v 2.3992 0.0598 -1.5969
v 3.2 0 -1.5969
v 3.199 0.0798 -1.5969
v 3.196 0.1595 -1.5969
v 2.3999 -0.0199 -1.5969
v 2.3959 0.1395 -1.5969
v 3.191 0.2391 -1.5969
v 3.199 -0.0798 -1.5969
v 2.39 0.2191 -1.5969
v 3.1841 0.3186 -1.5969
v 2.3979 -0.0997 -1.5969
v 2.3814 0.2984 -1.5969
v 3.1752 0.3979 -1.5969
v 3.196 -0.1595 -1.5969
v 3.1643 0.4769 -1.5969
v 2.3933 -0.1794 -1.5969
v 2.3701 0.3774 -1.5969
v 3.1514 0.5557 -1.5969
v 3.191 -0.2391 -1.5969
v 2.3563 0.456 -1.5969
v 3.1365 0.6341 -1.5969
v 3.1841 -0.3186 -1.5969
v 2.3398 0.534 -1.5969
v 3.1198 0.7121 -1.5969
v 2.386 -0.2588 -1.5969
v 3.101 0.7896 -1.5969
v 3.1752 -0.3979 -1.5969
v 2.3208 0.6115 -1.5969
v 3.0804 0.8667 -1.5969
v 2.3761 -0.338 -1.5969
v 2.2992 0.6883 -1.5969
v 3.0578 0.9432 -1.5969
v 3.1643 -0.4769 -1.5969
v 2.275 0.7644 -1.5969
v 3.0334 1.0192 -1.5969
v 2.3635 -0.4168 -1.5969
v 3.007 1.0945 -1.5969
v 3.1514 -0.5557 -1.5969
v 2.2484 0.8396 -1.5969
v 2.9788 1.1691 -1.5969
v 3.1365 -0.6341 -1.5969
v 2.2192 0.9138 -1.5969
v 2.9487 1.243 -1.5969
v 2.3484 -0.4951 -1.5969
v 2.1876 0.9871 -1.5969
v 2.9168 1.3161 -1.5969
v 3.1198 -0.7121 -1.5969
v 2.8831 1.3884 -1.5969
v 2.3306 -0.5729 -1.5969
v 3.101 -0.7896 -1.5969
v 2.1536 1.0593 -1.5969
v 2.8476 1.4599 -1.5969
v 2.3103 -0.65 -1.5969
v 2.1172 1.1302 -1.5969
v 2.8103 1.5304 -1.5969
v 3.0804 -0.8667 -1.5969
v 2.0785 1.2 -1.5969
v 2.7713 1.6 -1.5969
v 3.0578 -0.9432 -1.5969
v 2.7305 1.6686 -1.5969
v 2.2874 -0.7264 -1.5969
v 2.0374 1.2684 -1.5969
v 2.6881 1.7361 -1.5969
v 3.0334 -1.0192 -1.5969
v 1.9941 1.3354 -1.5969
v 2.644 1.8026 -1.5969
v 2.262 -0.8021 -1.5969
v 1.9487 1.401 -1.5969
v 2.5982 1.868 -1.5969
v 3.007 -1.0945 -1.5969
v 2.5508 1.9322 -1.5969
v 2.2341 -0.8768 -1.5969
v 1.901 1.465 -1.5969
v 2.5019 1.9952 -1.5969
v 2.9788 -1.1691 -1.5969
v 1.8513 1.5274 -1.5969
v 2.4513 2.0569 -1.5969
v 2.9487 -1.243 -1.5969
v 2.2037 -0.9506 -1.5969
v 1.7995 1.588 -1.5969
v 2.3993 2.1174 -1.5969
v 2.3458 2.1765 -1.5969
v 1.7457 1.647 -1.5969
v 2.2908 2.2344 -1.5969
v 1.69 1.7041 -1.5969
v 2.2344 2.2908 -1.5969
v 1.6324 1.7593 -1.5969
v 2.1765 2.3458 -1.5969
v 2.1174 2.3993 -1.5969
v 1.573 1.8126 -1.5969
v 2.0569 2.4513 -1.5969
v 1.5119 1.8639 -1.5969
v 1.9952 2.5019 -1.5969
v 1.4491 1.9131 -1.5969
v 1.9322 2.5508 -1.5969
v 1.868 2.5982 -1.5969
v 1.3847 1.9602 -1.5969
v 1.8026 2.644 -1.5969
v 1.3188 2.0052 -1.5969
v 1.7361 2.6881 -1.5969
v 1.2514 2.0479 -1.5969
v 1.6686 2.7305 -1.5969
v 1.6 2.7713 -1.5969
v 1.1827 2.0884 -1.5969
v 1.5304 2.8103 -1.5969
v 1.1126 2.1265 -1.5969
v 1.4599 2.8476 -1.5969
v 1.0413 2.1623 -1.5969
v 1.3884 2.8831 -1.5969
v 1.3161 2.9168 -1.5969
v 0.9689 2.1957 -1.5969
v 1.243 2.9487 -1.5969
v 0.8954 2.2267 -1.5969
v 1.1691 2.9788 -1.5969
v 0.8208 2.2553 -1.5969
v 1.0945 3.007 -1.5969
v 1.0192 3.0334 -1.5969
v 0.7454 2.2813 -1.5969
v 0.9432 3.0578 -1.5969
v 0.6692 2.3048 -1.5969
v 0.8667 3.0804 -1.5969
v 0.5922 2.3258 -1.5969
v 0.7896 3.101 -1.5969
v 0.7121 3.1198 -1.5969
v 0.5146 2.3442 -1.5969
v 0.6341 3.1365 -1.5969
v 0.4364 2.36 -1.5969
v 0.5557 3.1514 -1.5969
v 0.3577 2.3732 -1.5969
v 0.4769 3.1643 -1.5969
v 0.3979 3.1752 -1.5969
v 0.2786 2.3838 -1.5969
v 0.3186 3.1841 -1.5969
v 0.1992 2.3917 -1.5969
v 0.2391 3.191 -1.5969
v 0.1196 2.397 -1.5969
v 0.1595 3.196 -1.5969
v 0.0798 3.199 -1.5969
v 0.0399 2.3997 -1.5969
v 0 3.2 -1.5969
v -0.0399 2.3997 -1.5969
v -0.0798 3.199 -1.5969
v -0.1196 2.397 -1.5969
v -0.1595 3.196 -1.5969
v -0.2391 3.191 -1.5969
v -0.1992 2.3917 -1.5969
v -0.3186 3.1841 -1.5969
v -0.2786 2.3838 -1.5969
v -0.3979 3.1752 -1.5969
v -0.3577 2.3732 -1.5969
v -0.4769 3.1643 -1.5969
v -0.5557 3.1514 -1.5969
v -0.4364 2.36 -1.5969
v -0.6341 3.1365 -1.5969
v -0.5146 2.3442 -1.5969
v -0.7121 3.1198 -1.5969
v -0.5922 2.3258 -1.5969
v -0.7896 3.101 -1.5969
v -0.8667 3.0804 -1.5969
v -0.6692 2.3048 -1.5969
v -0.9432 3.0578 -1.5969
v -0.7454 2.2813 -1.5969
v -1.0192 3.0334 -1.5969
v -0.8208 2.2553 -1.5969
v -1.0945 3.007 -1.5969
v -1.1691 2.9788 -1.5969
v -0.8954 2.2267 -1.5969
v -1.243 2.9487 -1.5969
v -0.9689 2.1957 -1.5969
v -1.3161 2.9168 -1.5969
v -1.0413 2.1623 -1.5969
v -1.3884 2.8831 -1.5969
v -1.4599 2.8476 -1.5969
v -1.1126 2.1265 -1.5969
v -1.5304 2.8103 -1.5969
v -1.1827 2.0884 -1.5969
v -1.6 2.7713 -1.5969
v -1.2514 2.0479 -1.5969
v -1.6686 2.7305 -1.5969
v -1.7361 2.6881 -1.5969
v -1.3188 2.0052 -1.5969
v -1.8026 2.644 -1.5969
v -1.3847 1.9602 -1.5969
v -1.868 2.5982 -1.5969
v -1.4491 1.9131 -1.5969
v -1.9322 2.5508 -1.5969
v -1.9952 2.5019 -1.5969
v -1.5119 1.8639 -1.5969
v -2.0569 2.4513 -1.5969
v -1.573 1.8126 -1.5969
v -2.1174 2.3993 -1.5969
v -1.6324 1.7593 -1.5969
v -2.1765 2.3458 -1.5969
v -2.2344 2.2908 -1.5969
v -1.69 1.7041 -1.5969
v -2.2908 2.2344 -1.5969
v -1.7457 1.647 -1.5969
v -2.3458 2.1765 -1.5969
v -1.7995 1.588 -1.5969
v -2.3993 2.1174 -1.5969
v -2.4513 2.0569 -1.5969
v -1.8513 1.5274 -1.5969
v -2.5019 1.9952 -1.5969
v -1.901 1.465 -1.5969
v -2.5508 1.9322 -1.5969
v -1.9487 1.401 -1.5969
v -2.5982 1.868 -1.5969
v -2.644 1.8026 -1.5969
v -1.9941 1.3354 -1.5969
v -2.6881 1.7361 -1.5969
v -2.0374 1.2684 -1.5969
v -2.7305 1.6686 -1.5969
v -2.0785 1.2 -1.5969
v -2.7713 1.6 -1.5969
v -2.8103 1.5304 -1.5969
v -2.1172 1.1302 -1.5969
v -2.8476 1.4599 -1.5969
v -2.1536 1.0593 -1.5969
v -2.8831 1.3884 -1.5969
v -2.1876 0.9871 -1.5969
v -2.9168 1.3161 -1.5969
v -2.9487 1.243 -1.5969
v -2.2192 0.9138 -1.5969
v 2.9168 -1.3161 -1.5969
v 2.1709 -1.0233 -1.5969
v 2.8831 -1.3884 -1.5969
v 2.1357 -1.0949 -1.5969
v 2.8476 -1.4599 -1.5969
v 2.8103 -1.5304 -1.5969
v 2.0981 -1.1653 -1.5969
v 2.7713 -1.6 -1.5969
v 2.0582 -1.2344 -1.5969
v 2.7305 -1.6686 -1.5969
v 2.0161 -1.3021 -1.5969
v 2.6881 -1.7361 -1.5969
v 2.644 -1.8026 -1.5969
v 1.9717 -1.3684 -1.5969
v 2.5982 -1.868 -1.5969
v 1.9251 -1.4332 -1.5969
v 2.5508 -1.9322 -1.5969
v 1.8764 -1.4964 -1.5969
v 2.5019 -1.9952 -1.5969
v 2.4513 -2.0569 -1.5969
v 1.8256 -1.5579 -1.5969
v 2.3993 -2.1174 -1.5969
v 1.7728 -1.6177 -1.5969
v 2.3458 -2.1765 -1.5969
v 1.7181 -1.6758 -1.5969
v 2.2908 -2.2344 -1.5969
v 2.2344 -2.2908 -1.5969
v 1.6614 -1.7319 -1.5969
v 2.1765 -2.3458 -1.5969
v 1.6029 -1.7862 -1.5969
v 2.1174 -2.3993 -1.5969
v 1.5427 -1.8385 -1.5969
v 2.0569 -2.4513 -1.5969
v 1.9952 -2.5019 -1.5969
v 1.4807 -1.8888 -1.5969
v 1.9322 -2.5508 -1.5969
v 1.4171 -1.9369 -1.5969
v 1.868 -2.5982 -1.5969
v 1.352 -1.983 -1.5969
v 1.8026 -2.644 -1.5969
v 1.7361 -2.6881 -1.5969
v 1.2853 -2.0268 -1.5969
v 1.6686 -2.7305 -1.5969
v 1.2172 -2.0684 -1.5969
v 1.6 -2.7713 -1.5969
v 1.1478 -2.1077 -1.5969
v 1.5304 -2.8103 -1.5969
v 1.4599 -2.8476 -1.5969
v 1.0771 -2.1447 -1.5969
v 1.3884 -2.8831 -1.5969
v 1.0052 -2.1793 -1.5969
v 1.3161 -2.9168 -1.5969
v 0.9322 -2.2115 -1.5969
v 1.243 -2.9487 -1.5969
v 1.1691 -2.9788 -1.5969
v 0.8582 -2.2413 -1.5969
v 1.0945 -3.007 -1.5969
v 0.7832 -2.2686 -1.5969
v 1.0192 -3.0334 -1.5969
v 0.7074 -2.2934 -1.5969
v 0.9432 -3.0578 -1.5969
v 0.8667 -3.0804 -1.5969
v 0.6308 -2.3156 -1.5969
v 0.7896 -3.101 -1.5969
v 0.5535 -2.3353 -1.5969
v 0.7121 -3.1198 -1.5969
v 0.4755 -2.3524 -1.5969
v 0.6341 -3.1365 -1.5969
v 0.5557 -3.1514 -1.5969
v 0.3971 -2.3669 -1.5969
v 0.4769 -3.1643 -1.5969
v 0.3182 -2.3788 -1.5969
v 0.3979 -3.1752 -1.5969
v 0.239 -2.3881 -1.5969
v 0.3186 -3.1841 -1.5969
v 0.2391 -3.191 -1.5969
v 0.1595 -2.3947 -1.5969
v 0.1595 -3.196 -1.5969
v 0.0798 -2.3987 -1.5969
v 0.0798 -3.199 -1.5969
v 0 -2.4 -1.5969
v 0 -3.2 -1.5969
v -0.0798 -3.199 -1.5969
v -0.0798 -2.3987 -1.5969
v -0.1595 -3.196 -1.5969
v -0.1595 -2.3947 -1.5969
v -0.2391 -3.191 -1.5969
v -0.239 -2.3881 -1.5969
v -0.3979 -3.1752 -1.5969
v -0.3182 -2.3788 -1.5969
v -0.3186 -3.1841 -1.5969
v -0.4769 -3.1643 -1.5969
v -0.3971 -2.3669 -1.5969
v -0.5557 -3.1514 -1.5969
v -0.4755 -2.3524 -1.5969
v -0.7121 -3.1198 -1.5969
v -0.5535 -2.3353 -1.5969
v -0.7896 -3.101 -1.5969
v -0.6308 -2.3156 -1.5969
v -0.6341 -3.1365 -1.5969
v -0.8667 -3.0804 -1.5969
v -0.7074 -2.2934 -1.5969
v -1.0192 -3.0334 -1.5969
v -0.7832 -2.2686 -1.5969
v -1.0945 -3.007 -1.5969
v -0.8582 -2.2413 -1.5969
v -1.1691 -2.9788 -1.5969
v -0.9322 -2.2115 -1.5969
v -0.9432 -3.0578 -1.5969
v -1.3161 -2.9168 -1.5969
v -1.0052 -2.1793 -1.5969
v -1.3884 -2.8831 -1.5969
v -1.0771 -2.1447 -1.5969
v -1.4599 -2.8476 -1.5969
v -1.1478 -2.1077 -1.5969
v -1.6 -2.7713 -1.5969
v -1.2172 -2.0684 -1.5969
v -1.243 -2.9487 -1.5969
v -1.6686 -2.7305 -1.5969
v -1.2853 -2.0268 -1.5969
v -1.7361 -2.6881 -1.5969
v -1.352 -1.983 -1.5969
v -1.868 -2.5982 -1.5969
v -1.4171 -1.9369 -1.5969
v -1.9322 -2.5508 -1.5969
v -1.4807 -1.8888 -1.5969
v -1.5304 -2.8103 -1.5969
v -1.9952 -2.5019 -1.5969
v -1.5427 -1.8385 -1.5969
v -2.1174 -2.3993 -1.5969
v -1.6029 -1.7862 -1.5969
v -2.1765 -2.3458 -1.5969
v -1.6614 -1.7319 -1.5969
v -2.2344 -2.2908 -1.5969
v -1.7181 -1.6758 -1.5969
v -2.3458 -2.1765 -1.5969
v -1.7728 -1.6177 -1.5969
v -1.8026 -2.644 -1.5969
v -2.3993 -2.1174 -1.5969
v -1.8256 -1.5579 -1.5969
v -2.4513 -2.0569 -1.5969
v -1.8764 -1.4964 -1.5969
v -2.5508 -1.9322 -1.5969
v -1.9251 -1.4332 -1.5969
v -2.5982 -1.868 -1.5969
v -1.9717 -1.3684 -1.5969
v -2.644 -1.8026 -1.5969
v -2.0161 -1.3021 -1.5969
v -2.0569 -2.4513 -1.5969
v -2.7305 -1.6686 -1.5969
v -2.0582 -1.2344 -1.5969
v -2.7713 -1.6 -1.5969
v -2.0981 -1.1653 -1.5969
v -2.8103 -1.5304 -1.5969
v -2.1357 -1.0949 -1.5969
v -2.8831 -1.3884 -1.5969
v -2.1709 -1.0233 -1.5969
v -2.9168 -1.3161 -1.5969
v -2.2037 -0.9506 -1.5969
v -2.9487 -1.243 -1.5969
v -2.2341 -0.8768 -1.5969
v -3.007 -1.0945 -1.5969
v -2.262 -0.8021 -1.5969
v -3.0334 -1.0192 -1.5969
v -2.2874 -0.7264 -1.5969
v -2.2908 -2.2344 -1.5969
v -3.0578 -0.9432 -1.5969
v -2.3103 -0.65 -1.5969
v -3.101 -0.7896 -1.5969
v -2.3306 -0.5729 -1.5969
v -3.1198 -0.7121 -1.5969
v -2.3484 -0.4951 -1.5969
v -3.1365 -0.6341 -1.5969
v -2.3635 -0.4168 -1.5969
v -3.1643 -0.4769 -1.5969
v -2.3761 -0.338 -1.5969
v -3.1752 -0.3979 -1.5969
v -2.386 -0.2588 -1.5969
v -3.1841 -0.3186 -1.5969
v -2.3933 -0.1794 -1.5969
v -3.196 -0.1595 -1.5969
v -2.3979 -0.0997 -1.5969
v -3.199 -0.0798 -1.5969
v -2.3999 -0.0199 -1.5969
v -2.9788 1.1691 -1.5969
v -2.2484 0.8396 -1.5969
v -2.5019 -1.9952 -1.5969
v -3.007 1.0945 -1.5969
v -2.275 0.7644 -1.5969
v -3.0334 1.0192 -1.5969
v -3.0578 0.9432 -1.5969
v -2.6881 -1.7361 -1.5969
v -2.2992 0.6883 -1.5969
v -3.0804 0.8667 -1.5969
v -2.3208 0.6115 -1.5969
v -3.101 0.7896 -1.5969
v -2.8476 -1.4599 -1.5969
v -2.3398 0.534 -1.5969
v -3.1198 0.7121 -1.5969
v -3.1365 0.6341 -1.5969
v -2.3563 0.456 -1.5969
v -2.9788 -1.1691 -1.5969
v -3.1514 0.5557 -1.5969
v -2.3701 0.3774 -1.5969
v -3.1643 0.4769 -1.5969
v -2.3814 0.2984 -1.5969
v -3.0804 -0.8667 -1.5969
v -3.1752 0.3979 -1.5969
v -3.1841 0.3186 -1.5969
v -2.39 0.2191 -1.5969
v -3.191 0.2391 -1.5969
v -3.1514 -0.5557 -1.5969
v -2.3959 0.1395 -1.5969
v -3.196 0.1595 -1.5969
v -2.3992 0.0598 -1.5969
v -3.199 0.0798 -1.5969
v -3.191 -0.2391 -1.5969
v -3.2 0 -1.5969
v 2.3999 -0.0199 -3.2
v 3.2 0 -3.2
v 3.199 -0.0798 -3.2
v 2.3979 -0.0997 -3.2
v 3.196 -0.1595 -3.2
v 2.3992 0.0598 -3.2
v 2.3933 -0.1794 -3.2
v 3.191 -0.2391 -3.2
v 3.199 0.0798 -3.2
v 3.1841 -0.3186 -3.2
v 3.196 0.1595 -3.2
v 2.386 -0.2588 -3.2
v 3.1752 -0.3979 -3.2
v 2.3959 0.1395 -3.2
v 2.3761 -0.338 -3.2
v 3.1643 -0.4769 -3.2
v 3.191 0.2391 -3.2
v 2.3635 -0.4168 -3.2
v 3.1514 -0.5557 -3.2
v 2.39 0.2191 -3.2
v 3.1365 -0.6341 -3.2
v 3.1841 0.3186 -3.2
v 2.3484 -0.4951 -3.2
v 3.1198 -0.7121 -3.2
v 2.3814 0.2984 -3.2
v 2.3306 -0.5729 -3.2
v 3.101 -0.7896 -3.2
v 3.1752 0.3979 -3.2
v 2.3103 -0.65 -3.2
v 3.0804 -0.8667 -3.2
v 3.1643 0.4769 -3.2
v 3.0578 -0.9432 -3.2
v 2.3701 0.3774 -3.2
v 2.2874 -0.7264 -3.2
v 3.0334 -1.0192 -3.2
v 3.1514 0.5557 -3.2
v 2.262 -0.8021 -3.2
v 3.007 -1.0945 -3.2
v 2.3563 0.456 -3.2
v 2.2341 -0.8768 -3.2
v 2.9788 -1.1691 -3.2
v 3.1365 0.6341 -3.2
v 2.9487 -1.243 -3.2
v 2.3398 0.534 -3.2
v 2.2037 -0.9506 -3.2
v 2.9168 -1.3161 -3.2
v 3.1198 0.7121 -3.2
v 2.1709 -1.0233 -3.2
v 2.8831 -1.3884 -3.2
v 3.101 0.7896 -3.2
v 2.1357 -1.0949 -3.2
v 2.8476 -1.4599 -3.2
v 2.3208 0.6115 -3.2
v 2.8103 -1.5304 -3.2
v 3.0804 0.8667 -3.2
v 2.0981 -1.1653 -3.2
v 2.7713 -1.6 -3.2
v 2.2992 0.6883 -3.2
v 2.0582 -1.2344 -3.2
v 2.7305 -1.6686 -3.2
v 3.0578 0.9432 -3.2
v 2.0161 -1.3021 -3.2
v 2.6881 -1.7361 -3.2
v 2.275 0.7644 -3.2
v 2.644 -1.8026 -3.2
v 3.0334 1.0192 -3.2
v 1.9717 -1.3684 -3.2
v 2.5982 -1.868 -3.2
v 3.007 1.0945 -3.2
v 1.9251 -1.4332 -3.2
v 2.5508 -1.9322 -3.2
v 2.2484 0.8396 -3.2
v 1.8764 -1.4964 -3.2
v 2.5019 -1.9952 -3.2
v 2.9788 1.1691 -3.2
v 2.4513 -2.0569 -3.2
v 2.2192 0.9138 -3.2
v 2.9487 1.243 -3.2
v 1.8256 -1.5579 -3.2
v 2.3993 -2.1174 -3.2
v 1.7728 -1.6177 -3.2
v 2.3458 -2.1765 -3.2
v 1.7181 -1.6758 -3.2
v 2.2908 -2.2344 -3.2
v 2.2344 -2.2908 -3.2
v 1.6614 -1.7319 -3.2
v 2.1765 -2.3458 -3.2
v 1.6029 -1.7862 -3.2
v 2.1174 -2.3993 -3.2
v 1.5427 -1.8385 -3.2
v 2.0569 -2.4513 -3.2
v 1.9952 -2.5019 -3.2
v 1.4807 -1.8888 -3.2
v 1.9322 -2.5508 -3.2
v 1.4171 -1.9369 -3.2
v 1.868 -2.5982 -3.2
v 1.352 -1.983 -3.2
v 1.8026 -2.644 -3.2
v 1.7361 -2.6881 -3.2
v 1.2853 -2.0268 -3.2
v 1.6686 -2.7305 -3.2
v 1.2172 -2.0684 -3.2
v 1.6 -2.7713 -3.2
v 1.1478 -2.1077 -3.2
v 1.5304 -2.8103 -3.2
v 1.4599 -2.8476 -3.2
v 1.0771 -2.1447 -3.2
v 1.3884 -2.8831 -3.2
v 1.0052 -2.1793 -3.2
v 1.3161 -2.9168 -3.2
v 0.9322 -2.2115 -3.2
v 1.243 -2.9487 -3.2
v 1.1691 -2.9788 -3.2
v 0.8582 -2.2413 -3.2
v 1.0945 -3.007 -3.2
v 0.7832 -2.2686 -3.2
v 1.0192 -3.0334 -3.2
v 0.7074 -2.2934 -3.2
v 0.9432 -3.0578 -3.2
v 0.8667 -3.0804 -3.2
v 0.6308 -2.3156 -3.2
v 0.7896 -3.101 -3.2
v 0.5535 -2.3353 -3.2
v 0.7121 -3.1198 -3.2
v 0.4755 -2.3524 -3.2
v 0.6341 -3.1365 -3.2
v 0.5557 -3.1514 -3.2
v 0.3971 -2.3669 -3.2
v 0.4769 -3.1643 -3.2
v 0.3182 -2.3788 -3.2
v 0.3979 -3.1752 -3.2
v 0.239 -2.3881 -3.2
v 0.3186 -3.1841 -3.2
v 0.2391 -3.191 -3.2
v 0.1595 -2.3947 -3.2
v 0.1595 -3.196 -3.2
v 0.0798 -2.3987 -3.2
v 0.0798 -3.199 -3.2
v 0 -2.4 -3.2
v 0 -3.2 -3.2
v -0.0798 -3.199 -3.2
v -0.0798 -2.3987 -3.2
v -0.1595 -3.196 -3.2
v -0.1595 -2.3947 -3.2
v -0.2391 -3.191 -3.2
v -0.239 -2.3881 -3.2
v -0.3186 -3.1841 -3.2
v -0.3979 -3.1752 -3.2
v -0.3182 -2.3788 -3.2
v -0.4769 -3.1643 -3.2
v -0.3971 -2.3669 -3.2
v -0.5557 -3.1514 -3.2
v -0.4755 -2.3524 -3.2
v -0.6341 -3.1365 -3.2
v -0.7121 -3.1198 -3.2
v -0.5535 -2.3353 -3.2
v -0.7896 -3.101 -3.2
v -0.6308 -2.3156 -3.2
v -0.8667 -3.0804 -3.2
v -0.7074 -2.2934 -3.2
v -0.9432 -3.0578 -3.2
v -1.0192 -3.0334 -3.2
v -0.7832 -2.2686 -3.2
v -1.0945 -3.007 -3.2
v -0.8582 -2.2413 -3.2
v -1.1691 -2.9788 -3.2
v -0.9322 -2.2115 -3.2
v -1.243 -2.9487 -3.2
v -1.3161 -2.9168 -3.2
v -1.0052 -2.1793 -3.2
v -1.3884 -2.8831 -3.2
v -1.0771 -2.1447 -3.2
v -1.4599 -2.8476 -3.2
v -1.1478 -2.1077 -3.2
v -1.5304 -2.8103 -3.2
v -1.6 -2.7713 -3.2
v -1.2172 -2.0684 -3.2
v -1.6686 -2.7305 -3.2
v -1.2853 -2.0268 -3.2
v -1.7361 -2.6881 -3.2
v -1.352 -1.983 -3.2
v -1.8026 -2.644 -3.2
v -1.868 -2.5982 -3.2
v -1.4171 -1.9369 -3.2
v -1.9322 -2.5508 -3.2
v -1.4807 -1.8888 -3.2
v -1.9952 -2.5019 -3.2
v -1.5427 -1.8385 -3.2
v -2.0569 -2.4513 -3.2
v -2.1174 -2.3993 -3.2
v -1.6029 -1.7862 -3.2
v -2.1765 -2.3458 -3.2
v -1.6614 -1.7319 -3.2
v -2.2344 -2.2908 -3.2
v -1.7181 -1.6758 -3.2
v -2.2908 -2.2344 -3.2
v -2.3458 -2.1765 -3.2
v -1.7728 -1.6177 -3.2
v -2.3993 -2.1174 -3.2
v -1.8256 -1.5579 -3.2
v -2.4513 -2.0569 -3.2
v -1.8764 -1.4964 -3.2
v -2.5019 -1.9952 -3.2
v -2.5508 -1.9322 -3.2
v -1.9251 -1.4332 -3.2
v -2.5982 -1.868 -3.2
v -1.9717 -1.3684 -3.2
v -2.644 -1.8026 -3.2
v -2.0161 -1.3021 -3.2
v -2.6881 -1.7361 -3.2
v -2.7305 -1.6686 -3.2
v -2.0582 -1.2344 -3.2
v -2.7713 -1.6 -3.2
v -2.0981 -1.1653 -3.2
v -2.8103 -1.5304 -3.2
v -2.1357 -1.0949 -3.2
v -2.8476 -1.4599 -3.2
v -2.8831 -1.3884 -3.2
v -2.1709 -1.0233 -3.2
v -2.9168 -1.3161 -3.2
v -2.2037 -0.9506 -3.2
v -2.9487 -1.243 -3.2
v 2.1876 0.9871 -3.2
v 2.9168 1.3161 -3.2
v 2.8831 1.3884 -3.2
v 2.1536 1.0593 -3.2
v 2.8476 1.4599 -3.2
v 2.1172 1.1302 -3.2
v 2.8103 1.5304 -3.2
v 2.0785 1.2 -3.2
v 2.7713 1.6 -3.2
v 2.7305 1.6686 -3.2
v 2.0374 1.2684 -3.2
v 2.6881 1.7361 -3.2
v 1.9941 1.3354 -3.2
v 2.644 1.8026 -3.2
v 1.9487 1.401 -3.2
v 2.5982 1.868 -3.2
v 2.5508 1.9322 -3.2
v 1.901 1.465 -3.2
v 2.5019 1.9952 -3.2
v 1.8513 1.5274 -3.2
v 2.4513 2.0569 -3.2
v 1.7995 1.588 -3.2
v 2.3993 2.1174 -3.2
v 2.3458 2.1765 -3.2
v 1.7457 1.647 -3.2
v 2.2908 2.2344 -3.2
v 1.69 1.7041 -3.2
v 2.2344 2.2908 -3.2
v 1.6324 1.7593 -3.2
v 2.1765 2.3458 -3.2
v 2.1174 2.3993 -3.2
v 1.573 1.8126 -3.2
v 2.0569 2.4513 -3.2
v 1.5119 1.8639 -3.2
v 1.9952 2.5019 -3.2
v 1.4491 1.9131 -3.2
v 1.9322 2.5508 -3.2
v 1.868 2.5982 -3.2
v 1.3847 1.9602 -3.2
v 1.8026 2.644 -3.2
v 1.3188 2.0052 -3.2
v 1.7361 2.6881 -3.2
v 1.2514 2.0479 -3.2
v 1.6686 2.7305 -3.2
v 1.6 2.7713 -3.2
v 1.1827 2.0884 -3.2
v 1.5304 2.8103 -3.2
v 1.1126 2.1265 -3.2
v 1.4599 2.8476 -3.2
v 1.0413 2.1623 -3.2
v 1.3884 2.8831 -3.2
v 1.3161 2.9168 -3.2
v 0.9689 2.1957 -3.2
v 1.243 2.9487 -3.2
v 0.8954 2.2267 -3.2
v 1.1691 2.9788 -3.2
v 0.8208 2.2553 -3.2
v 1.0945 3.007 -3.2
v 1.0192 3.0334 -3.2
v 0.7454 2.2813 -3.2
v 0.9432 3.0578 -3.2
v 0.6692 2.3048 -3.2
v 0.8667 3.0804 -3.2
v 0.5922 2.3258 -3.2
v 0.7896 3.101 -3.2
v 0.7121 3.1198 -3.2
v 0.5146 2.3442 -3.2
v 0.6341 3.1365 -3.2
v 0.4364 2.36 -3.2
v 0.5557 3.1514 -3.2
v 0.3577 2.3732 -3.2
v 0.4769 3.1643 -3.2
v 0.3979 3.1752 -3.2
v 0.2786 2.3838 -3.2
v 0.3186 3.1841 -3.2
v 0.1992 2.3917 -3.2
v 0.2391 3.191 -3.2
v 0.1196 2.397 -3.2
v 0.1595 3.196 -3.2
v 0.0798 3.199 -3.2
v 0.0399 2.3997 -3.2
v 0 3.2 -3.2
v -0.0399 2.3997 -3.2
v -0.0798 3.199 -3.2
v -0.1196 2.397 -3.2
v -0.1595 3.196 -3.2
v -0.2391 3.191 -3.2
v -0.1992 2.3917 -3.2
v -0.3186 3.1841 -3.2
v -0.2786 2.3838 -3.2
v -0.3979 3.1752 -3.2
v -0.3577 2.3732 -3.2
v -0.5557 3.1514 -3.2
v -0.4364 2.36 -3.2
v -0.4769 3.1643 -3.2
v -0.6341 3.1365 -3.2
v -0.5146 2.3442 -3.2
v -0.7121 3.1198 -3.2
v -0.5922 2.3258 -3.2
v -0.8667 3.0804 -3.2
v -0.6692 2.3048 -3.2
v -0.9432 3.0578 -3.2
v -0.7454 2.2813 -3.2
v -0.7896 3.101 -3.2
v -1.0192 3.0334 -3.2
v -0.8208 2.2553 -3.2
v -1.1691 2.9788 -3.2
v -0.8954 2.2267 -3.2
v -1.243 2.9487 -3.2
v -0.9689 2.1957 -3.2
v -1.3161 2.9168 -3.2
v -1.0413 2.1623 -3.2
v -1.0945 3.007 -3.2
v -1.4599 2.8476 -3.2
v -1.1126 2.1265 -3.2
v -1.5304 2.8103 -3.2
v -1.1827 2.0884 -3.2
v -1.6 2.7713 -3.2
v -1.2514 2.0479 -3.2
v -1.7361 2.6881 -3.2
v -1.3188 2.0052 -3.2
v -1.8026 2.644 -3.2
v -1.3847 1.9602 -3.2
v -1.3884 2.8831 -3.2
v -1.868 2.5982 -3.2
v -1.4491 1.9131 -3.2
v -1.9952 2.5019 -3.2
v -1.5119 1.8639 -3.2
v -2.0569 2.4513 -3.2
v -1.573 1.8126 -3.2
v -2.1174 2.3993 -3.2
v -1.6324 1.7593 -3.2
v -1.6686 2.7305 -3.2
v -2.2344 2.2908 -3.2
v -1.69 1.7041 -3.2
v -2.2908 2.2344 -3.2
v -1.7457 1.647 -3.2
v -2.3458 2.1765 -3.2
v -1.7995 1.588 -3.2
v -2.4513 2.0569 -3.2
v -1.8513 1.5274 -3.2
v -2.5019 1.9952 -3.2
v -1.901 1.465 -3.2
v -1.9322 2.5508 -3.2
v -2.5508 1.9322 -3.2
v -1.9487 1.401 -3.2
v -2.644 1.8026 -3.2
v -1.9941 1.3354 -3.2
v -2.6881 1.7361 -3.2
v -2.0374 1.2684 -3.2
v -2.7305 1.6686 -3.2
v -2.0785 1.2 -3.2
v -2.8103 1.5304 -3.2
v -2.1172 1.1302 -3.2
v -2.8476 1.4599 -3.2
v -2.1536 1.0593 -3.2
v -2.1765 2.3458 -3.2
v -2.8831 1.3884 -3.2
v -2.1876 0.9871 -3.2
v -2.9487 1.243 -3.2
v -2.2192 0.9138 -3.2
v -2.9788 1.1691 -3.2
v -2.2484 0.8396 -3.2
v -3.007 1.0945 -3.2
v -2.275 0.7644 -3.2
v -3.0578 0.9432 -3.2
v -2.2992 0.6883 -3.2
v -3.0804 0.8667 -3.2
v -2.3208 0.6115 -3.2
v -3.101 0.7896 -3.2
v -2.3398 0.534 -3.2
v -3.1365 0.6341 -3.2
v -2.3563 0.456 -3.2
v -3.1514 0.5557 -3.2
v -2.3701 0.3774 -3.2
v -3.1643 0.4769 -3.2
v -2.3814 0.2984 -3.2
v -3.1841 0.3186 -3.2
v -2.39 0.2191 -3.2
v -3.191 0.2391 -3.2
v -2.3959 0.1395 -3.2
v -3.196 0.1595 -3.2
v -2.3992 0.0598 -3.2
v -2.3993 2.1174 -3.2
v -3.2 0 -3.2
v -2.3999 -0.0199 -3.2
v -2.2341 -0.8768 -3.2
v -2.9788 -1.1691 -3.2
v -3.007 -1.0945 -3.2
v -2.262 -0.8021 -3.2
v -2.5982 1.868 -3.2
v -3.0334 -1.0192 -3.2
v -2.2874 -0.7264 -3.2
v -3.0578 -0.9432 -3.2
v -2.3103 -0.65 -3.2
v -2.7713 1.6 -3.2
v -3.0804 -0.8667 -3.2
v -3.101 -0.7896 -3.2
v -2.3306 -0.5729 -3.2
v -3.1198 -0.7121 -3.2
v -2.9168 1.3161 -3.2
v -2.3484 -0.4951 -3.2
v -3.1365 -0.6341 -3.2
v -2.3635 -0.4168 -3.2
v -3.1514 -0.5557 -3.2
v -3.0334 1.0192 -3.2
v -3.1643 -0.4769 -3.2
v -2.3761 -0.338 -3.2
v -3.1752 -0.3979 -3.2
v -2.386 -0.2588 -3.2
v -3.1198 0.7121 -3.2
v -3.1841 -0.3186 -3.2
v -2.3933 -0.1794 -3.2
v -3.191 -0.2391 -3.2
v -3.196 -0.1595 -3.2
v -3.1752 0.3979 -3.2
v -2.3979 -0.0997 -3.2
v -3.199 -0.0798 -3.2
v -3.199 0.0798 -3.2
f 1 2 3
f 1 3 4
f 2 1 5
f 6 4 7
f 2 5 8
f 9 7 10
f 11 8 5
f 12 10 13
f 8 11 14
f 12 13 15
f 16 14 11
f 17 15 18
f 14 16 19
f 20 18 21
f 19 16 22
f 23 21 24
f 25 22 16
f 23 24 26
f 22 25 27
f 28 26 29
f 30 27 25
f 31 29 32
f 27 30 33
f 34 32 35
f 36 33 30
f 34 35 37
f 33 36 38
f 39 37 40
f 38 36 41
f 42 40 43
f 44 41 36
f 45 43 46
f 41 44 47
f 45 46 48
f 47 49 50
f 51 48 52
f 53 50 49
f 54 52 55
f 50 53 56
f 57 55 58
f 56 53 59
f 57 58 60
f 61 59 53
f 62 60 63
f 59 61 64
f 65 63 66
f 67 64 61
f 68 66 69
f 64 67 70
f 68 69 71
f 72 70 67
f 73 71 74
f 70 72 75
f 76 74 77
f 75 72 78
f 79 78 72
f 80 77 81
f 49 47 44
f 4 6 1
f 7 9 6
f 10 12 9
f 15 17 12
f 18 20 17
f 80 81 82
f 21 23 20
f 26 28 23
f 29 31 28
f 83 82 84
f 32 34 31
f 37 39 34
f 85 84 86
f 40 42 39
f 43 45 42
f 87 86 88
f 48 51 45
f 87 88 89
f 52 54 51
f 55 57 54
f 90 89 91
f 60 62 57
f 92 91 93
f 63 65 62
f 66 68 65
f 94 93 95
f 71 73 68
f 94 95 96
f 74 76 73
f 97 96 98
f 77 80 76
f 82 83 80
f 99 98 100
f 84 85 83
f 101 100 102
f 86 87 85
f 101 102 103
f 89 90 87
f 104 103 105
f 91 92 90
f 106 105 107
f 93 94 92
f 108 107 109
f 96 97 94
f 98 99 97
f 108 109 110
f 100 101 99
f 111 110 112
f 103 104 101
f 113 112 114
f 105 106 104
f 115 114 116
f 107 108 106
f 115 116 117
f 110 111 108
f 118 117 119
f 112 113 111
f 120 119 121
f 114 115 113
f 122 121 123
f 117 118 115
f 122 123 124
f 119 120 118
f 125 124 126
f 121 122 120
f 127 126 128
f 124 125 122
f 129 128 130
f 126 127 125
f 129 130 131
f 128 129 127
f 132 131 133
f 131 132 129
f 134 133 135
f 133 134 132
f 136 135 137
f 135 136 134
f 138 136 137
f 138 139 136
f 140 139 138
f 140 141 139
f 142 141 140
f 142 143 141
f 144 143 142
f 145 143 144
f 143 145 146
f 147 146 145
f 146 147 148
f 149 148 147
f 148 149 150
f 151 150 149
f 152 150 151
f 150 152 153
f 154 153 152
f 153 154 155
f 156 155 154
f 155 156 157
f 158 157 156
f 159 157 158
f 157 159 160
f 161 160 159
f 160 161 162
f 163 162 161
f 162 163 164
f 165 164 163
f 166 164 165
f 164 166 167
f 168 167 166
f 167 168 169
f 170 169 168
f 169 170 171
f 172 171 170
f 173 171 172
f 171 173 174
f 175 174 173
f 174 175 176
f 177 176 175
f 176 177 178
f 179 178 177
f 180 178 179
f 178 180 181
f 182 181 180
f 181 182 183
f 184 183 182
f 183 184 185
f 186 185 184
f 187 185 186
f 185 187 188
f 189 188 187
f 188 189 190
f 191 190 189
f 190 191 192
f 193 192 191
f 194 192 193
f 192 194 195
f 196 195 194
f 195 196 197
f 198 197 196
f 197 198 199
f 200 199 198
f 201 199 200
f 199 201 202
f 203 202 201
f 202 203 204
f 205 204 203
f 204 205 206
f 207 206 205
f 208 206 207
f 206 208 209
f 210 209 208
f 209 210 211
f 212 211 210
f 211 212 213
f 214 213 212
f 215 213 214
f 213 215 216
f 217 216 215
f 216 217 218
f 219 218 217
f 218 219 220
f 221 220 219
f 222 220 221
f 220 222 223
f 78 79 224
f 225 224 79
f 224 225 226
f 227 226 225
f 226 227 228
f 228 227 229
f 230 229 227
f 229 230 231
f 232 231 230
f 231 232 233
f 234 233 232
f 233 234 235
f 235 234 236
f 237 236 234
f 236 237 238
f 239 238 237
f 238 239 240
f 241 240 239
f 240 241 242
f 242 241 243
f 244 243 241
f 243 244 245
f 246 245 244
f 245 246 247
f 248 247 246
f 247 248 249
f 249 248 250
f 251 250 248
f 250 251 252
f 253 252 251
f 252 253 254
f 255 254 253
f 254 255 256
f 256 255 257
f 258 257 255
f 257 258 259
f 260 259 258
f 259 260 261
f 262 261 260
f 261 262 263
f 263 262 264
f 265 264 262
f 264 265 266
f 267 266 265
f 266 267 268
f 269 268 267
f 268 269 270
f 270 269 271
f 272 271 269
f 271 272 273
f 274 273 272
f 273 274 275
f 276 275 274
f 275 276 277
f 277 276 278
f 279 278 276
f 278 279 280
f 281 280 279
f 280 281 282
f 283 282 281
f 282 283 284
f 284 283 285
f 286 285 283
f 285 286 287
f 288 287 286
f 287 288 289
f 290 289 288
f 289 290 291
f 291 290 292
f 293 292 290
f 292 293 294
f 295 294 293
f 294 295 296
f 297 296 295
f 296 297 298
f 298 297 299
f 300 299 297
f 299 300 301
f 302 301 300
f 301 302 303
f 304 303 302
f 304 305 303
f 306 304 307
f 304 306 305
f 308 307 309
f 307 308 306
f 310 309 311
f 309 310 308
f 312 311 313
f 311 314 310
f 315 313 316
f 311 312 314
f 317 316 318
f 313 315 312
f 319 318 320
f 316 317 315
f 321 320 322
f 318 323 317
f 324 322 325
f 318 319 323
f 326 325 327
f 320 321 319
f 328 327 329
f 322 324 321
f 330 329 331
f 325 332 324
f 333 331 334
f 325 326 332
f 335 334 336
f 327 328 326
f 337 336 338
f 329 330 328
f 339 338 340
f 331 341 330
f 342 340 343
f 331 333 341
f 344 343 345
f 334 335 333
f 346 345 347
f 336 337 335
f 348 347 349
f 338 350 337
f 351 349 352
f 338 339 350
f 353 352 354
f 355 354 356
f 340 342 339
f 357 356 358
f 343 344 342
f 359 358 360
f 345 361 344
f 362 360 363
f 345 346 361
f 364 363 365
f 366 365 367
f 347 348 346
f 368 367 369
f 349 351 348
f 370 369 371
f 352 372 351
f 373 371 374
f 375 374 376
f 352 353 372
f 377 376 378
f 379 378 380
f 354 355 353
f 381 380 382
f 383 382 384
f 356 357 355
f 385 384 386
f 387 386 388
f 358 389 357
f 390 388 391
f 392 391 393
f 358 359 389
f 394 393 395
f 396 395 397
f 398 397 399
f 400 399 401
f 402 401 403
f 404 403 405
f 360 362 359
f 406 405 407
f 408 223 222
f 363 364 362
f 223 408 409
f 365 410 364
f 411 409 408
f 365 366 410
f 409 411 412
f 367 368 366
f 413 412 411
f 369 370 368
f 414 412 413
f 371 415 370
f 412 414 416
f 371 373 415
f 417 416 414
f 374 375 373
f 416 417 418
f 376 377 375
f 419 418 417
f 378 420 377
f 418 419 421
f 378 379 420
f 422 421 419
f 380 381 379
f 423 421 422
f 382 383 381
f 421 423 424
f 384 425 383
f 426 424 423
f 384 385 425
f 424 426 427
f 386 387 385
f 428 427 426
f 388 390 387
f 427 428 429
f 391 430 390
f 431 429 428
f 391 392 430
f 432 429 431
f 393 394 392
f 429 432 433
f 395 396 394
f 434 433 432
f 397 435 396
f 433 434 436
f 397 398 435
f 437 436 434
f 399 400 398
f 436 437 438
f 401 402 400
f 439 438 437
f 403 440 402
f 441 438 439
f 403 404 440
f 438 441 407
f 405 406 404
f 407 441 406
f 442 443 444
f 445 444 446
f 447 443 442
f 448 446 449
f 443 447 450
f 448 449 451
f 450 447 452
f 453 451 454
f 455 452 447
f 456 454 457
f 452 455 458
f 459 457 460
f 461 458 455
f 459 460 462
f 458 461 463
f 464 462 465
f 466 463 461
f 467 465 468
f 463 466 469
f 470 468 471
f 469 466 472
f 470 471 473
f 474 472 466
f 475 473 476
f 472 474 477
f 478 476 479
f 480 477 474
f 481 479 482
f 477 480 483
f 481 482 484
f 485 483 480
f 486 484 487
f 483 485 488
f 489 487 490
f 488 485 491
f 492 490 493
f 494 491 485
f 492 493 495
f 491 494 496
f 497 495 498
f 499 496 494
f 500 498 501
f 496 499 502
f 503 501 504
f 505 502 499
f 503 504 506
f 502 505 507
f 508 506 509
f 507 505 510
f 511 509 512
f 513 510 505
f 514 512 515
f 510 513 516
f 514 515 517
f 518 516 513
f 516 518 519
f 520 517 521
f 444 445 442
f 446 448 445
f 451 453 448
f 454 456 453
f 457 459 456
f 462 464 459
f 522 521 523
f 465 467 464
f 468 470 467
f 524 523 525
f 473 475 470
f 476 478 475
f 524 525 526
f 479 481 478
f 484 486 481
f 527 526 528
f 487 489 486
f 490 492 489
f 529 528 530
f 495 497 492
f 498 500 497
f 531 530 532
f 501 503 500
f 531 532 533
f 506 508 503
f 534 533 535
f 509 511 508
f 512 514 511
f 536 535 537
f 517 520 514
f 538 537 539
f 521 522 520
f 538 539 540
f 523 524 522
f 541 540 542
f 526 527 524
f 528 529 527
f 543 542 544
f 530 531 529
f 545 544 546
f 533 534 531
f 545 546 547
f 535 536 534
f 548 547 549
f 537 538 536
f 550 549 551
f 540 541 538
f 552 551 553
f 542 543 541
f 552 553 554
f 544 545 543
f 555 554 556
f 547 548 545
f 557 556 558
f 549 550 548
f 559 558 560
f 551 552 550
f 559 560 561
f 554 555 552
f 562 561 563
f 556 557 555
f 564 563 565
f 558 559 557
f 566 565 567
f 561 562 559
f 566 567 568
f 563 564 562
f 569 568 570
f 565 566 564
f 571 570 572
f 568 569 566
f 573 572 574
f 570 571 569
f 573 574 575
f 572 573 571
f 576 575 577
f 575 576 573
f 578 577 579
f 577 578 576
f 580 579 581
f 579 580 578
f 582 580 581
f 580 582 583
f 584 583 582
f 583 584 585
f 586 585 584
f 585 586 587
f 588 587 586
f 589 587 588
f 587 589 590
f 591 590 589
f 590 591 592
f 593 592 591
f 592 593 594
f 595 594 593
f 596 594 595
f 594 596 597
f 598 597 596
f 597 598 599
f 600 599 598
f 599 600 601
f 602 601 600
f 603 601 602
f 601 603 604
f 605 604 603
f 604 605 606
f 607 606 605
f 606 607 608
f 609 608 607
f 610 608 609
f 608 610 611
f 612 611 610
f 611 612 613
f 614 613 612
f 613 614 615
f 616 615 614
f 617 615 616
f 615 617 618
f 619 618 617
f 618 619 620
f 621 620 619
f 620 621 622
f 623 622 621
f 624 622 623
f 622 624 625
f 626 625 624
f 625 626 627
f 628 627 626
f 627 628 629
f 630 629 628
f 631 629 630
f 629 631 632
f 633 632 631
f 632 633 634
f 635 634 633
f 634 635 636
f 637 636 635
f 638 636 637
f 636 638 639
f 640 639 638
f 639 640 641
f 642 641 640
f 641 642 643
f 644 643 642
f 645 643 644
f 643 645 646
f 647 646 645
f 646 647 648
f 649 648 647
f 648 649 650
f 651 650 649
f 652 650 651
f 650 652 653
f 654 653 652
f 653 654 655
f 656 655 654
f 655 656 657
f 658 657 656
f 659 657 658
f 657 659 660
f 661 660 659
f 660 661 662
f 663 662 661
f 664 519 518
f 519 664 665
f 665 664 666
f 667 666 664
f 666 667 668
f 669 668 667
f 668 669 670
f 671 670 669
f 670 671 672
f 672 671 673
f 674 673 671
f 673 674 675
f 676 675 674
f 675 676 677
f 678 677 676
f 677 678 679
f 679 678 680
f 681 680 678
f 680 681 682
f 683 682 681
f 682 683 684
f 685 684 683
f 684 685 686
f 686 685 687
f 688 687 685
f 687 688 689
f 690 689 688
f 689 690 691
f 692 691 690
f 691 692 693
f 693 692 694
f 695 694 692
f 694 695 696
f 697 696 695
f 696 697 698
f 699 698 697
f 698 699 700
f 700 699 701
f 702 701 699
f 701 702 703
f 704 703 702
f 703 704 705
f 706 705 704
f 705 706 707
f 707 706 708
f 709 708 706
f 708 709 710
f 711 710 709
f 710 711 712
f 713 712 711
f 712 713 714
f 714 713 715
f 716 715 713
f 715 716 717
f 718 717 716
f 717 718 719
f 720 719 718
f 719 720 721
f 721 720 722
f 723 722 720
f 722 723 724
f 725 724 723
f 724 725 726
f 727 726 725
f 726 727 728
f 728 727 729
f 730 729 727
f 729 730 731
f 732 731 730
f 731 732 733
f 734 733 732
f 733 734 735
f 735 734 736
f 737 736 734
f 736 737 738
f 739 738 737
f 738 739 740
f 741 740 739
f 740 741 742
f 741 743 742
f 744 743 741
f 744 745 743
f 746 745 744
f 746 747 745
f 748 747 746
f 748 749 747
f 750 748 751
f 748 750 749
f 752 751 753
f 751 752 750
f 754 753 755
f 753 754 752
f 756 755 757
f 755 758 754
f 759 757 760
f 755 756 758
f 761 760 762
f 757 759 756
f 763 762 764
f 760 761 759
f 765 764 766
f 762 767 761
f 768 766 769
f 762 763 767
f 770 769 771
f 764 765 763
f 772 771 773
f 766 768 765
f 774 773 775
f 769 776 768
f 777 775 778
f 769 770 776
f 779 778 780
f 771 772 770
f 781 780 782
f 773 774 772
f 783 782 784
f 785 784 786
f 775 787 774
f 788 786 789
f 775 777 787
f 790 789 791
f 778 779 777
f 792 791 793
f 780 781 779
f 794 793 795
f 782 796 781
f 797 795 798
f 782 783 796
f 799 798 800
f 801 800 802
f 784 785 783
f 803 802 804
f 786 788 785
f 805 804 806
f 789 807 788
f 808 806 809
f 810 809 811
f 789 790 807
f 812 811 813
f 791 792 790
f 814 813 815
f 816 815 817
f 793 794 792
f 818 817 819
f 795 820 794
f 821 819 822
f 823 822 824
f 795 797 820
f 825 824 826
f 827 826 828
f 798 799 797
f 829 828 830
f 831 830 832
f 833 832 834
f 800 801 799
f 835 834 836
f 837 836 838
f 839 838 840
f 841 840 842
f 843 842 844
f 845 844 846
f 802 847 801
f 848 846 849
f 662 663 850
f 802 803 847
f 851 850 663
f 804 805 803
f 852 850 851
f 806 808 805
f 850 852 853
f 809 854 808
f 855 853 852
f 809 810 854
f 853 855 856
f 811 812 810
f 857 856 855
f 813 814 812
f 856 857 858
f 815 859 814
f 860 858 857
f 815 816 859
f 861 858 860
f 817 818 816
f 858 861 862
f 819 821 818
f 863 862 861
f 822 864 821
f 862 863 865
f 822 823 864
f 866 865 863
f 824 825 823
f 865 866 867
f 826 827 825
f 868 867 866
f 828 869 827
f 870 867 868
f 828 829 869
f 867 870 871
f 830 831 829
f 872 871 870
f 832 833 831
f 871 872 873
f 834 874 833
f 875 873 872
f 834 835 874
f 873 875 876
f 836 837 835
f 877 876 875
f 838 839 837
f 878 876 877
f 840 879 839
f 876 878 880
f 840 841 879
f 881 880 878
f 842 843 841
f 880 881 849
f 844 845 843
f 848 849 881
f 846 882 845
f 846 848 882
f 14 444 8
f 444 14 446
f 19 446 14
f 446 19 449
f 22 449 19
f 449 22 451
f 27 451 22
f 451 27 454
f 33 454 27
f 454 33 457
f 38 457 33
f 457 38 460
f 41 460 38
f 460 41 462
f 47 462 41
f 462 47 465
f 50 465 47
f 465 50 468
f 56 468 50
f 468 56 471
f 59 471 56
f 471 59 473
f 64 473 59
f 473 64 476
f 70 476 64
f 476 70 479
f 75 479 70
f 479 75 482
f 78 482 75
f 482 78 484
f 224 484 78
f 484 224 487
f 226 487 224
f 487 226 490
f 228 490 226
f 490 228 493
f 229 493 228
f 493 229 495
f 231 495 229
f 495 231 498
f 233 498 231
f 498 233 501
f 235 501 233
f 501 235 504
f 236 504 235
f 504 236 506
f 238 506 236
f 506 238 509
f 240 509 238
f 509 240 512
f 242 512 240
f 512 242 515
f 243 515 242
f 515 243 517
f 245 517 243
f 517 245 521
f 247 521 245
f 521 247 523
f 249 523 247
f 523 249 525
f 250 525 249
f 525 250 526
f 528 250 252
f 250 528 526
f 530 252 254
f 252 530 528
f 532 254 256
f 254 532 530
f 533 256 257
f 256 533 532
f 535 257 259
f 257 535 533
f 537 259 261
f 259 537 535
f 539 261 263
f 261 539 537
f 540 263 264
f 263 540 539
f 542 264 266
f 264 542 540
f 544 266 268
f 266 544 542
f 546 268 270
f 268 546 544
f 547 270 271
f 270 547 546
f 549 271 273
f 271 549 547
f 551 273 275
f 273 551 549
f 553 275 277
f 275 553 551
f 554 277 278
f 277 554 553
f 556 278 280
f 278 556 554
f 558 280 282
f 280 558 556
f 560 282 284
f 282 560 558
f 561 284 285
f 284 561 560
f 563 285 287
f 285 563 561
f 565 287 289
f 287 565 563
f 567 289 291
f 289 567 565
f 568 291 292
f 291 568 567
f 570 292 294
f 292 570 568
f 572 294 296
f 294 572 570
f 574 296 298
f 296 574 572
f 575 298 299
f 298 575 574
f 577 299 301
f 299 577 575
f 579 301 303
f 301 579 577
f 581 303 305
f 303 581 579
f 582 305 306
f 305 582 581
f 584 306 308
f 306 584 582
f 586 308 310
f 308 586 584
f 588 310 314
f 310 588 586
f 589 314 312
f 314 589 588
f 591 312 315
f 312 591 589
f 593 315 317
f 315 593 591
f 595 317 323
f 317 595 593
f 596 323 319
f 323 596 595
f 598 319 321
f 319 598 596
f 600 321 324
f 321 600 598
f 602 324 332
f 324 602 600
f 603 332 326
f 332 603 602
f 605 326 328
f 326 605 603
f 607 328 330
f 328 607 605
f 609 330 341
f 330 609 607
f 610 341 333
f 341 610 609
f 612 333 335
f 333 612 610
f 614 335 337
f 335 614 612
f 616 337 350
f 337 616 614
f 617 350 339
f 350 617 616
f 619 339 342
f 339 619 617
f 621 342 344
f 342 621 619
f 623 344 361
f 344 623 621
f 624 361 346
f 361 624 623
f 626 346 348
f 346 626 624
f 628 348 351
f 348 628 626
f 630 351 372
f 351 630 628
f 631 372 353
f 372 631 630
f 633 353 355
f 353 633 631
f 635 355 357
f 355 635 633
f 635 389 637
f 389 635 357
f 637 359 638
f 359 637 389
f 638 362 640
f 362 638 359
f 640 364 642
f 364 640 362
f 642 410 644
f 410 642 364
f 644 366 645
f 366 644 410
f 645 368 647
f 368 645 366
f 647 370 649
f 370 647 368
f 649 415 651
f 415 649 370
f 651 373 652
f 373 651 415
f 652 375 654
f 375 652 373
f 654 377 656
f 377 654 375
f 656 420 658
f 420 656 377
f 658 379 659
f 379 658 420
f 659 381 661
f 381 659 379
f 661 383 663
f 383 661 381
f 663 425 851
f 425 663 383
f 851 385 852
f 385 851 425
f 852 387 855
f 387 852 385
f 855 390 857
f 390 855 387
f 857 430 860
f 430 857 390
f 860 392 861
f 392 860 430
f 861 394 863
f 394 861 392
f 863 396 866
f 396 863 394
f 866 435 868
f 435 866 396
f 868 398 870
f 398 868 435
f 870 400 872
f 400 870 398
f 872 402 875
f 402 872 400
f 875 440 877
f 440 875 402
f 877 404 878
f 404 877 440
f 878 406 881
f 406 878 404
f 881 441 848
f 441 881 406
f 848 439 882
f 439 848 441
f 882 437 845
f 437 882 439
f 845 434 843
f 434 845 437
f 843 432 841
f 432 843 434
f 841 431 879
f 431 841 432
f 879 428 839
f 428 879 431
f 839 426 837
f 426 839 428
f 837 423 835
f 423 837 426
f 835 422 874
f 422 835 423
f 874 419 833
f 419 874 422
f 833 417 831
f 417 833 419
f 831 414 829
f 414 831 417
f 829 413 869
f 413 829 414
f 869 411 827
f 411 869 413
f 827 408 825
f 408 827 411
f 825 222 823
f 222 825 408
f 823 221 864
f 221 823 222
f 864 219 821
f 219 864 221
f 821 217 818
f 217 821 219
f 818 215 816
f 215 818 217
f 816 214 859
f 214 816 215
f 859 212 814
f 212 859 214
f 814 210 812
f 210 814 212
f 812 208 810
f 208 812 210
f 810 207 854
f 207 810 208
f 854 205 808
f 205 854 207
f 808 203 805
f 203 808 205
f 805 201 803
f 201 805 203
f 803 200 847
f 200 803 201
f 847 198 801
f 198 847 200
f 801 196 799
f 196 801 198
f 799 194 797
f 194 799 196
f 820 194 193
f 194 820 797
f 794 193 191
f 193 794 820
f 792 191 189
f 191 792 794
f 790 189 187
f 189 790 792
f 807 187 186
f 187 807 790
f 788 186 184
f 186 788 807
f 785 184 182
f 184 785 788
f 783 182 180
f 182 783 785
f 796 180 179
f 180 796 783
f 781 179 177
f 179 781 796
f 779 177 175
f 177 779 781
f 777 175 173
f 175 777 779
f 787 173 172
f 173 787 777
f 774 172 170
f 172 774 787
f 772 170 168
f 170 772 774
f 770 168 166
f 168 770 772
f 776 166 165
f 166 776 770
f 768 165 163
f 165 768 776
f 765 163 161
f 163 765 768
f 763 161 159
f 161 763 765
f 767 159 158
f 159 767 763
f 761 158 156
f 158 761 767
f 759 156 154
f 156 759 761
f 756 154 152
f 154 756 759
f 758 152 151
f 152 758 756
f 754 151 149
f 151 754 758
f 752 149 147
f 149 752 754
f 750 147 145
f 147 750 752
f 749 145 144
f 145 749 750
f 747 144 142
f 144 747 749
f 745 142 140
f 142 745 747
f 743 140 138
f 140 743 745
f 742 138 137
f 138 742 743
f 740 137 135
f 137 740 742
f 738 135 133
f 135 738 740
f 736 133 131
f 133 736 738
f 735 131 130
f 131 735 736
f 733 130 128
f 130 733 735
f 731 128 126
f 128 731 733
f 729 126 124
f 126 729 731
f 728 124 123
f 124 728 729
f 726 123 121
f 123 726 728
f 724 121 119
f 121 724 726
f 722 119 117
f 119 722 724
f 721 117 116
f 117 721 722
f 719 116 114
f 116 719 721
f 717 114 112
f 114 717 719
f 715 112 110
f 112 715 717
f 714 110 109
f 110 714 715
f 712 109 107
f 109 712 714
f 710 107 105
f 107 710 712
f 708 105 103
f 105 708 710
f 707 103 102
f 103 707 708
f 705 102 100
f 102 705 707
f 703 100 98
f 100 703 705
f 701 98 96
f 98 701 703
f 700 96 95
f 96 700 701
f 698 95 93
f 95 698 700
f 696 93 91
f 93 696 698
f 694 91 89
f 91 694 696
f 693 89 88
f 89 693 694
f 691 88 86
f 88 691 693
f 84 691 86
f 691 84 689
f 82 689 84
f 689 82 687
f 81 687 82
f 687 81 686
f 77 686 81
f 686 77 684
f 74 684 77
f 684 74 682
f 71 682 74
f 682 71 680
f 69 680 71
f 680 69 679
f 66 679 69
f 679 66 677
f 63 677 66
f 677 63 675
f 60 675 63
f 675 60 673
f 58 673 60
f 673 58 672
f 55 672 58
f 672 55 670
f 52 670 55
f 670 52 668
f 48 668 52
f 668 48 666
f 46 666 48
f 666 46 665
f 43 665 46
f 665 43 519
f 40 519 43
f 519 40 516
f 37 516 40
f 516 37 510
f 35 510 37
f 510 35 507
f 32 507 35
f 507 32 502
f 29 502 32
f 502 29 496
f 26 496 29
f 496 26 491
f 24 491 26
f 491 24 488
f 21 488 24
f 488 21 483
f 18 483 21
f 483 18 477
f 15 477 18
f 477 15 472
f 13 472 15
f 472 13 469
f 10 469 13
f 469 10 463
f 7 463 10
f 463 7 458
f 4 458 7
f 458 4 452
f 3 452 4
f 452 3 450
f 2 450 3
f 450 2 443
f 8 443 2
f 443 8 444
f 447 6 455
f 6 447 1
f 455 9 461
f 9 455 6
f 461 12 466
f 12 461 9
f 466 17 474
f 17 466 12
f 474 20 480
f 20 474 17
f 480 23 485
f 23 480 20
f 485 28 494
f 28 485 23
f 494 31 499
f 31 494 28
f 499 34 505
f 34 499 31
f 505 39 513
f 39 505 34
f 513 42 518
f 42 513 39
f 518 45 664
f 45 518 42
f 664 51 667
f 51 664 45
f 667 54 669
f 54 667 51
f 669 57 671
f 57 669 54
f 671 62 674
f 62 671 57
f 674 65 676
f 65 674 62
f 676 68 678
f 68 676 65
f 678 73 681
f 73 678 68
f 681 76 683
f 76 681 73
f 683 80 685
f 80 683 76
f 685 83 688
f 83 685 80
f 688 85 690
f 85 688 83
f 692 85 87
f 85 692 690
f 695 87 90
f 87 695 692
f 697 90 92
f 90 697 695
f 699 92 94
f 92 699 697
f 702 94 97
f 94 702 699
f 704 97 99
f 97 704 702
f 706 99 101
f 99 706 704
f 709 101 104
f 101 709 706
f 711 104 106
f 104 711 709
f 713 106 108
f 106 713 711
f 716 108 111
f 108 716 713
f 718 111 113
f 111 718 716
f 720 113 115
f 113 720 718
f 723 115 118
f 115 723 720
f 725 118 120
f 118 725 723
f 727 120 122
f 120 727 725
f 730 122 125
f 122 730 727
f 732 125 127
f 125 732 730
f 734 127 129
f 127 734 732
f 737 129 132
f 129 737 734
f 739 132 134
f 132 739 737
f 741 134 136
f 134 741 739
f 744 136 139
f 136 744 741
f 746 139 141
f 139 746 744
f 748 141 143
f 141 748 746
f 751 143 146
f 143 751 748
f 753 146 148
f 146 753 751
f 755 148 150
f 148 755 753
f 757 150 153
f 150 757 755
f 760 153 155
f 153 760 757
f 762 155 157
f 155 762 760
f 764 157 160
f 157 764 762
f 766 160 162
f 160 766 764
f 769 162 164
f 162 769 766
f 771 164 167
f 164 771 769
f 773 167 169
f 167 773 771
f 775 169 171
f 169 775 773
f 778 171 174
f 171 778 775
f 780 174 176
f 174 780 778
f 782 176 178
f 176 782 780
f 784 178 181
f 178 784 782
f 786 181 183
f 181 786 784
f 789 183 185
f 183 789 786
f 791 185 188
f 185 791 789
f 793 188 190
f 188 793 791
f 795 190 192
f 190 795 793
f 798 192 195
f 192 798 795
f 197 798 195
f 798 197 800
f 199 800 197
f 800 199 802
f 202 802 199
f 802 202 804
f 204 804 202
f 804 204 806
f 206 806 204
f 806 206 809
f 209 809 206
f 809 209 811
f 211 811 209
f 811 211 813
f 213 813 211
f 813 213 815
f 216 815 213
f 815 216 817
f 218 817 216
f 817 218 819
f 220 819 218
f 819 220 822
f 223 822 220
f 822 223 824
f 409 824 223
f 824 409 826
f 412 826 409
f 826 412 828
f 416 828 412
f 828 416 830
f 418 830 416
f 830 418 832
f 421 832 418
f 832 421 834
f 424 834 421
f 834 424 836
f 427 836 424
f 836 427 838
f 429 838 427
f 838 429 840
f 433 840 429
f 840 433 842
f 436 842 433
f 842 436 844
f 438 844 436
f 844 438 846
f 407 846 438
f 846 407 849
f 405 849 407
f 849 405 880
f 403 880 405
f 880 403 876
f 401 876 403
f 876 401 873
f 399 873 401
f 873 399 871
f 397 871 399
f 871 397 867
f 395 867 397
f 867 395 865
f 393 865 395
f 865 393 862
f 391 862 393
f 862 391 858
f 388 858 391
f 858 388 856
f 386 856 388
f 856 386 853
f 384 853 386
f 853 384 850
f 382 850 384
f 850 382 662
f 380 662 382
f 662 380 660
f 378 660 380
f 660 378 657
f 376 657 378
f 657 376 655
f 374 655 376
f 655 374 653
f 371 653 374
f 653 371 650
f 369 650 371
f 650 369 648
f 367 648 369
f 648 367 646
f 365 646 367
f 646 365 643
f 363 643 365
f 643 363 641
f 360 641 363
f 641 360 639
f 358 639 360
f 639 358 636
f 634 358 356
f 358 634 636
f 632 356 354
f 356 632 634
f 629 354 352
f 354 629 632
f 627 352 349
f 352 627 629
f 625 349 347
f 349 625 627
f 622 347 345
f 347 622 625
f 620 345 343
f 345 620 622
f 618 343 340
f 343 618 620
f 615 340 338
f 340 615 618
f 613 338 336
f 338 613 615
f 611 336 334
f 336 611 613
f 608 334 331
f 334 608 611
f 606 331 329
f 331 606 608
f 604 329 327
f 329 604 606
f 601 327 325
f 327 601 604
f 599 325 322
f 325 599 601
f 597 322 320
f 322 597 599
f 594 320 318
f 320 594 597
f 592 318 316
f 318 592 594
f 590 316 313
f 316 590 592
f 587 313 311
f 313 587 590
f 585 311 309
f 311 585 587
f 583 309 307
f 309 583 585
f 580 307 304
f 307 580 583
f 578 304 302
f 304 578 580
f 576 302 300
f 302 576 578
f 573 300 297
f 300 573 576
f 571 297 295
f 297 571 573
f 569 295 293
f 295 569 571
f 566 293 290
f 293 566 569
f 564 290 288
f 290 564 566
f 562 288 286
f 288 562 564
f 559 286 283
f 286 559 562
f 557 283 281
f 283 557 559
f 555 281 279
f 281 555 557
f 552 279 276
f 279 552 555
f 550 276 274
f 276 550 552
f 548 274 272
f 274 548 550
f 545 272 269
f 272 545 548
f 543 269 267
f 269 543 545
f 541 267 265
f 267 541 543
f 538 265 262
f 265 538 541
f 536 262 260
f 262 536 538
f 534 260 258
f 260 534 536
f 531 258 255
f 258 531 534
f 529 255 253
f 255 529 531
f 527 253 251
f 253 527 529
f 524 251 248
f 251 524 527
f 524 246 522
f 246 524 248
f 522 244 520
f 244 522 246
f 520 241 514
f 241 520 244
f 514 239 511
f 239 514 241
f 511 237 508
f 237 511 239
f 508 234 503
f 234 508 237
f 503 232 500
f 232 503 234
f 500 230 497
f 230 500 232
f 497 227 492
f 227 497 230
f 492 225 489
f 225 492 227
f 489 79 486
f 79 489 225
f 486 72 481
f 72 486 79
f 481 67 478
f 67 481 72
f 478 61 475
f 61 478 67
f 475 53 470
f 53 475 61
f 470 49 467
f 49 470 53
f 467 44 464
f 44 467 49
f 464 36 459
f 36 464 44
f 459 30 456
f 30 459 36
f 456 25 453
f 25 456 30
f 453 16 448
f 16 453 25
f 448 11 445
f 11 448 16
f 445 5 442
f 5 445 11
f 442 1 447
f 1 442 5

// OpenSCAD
use <../lib.scad>
use <43898.scad>
$fa=1; $fs=0.2;
function ldraw_lib__44882(realsolid=false) = [
// 0 =Dish  3 x  3 Inverted
// 0 Name: 44882.dat
// 0 Author: Rolf Osterthun [Rolf]
// 0 !LDRAW_ORG Part Alias UPDATE 2013-02
// 0 !LICENSE Licensed under CC BY 2.0 and CC BY 4.0 : see CAreadme.txt
// 
// 0 BFC CERTIFY CCW
  [0,"BFC","CERTIFY"],
  [0,"BFC","CCW"],
// 
// 0 !HISTORY 2013-12-23 [PTadmin] Official Update 2013-02
// 
// 
// 0 // Alias of 43898
// 0 // Part 44882 is the transparent counterpart of 43898
// 
// 1 16 0 0 0 1 0 0 0 1 0 0 0 1 43898.dat
  [1,16,0,0,0,1,0,0,0,1,0,0,0,1, ldraw_lib__43898(realsolid)],
];
module ldraw_lib__44882(step=0, col=false, unit=2/5, alt=false, line=0.2, solid=!$preview)
    makepoly(ldraw_lib__44882(solid), step=step, col=col, unit=unit, alt=alt, line=line, solid=solid);
ldraw_lib__44882(line=0.2);
